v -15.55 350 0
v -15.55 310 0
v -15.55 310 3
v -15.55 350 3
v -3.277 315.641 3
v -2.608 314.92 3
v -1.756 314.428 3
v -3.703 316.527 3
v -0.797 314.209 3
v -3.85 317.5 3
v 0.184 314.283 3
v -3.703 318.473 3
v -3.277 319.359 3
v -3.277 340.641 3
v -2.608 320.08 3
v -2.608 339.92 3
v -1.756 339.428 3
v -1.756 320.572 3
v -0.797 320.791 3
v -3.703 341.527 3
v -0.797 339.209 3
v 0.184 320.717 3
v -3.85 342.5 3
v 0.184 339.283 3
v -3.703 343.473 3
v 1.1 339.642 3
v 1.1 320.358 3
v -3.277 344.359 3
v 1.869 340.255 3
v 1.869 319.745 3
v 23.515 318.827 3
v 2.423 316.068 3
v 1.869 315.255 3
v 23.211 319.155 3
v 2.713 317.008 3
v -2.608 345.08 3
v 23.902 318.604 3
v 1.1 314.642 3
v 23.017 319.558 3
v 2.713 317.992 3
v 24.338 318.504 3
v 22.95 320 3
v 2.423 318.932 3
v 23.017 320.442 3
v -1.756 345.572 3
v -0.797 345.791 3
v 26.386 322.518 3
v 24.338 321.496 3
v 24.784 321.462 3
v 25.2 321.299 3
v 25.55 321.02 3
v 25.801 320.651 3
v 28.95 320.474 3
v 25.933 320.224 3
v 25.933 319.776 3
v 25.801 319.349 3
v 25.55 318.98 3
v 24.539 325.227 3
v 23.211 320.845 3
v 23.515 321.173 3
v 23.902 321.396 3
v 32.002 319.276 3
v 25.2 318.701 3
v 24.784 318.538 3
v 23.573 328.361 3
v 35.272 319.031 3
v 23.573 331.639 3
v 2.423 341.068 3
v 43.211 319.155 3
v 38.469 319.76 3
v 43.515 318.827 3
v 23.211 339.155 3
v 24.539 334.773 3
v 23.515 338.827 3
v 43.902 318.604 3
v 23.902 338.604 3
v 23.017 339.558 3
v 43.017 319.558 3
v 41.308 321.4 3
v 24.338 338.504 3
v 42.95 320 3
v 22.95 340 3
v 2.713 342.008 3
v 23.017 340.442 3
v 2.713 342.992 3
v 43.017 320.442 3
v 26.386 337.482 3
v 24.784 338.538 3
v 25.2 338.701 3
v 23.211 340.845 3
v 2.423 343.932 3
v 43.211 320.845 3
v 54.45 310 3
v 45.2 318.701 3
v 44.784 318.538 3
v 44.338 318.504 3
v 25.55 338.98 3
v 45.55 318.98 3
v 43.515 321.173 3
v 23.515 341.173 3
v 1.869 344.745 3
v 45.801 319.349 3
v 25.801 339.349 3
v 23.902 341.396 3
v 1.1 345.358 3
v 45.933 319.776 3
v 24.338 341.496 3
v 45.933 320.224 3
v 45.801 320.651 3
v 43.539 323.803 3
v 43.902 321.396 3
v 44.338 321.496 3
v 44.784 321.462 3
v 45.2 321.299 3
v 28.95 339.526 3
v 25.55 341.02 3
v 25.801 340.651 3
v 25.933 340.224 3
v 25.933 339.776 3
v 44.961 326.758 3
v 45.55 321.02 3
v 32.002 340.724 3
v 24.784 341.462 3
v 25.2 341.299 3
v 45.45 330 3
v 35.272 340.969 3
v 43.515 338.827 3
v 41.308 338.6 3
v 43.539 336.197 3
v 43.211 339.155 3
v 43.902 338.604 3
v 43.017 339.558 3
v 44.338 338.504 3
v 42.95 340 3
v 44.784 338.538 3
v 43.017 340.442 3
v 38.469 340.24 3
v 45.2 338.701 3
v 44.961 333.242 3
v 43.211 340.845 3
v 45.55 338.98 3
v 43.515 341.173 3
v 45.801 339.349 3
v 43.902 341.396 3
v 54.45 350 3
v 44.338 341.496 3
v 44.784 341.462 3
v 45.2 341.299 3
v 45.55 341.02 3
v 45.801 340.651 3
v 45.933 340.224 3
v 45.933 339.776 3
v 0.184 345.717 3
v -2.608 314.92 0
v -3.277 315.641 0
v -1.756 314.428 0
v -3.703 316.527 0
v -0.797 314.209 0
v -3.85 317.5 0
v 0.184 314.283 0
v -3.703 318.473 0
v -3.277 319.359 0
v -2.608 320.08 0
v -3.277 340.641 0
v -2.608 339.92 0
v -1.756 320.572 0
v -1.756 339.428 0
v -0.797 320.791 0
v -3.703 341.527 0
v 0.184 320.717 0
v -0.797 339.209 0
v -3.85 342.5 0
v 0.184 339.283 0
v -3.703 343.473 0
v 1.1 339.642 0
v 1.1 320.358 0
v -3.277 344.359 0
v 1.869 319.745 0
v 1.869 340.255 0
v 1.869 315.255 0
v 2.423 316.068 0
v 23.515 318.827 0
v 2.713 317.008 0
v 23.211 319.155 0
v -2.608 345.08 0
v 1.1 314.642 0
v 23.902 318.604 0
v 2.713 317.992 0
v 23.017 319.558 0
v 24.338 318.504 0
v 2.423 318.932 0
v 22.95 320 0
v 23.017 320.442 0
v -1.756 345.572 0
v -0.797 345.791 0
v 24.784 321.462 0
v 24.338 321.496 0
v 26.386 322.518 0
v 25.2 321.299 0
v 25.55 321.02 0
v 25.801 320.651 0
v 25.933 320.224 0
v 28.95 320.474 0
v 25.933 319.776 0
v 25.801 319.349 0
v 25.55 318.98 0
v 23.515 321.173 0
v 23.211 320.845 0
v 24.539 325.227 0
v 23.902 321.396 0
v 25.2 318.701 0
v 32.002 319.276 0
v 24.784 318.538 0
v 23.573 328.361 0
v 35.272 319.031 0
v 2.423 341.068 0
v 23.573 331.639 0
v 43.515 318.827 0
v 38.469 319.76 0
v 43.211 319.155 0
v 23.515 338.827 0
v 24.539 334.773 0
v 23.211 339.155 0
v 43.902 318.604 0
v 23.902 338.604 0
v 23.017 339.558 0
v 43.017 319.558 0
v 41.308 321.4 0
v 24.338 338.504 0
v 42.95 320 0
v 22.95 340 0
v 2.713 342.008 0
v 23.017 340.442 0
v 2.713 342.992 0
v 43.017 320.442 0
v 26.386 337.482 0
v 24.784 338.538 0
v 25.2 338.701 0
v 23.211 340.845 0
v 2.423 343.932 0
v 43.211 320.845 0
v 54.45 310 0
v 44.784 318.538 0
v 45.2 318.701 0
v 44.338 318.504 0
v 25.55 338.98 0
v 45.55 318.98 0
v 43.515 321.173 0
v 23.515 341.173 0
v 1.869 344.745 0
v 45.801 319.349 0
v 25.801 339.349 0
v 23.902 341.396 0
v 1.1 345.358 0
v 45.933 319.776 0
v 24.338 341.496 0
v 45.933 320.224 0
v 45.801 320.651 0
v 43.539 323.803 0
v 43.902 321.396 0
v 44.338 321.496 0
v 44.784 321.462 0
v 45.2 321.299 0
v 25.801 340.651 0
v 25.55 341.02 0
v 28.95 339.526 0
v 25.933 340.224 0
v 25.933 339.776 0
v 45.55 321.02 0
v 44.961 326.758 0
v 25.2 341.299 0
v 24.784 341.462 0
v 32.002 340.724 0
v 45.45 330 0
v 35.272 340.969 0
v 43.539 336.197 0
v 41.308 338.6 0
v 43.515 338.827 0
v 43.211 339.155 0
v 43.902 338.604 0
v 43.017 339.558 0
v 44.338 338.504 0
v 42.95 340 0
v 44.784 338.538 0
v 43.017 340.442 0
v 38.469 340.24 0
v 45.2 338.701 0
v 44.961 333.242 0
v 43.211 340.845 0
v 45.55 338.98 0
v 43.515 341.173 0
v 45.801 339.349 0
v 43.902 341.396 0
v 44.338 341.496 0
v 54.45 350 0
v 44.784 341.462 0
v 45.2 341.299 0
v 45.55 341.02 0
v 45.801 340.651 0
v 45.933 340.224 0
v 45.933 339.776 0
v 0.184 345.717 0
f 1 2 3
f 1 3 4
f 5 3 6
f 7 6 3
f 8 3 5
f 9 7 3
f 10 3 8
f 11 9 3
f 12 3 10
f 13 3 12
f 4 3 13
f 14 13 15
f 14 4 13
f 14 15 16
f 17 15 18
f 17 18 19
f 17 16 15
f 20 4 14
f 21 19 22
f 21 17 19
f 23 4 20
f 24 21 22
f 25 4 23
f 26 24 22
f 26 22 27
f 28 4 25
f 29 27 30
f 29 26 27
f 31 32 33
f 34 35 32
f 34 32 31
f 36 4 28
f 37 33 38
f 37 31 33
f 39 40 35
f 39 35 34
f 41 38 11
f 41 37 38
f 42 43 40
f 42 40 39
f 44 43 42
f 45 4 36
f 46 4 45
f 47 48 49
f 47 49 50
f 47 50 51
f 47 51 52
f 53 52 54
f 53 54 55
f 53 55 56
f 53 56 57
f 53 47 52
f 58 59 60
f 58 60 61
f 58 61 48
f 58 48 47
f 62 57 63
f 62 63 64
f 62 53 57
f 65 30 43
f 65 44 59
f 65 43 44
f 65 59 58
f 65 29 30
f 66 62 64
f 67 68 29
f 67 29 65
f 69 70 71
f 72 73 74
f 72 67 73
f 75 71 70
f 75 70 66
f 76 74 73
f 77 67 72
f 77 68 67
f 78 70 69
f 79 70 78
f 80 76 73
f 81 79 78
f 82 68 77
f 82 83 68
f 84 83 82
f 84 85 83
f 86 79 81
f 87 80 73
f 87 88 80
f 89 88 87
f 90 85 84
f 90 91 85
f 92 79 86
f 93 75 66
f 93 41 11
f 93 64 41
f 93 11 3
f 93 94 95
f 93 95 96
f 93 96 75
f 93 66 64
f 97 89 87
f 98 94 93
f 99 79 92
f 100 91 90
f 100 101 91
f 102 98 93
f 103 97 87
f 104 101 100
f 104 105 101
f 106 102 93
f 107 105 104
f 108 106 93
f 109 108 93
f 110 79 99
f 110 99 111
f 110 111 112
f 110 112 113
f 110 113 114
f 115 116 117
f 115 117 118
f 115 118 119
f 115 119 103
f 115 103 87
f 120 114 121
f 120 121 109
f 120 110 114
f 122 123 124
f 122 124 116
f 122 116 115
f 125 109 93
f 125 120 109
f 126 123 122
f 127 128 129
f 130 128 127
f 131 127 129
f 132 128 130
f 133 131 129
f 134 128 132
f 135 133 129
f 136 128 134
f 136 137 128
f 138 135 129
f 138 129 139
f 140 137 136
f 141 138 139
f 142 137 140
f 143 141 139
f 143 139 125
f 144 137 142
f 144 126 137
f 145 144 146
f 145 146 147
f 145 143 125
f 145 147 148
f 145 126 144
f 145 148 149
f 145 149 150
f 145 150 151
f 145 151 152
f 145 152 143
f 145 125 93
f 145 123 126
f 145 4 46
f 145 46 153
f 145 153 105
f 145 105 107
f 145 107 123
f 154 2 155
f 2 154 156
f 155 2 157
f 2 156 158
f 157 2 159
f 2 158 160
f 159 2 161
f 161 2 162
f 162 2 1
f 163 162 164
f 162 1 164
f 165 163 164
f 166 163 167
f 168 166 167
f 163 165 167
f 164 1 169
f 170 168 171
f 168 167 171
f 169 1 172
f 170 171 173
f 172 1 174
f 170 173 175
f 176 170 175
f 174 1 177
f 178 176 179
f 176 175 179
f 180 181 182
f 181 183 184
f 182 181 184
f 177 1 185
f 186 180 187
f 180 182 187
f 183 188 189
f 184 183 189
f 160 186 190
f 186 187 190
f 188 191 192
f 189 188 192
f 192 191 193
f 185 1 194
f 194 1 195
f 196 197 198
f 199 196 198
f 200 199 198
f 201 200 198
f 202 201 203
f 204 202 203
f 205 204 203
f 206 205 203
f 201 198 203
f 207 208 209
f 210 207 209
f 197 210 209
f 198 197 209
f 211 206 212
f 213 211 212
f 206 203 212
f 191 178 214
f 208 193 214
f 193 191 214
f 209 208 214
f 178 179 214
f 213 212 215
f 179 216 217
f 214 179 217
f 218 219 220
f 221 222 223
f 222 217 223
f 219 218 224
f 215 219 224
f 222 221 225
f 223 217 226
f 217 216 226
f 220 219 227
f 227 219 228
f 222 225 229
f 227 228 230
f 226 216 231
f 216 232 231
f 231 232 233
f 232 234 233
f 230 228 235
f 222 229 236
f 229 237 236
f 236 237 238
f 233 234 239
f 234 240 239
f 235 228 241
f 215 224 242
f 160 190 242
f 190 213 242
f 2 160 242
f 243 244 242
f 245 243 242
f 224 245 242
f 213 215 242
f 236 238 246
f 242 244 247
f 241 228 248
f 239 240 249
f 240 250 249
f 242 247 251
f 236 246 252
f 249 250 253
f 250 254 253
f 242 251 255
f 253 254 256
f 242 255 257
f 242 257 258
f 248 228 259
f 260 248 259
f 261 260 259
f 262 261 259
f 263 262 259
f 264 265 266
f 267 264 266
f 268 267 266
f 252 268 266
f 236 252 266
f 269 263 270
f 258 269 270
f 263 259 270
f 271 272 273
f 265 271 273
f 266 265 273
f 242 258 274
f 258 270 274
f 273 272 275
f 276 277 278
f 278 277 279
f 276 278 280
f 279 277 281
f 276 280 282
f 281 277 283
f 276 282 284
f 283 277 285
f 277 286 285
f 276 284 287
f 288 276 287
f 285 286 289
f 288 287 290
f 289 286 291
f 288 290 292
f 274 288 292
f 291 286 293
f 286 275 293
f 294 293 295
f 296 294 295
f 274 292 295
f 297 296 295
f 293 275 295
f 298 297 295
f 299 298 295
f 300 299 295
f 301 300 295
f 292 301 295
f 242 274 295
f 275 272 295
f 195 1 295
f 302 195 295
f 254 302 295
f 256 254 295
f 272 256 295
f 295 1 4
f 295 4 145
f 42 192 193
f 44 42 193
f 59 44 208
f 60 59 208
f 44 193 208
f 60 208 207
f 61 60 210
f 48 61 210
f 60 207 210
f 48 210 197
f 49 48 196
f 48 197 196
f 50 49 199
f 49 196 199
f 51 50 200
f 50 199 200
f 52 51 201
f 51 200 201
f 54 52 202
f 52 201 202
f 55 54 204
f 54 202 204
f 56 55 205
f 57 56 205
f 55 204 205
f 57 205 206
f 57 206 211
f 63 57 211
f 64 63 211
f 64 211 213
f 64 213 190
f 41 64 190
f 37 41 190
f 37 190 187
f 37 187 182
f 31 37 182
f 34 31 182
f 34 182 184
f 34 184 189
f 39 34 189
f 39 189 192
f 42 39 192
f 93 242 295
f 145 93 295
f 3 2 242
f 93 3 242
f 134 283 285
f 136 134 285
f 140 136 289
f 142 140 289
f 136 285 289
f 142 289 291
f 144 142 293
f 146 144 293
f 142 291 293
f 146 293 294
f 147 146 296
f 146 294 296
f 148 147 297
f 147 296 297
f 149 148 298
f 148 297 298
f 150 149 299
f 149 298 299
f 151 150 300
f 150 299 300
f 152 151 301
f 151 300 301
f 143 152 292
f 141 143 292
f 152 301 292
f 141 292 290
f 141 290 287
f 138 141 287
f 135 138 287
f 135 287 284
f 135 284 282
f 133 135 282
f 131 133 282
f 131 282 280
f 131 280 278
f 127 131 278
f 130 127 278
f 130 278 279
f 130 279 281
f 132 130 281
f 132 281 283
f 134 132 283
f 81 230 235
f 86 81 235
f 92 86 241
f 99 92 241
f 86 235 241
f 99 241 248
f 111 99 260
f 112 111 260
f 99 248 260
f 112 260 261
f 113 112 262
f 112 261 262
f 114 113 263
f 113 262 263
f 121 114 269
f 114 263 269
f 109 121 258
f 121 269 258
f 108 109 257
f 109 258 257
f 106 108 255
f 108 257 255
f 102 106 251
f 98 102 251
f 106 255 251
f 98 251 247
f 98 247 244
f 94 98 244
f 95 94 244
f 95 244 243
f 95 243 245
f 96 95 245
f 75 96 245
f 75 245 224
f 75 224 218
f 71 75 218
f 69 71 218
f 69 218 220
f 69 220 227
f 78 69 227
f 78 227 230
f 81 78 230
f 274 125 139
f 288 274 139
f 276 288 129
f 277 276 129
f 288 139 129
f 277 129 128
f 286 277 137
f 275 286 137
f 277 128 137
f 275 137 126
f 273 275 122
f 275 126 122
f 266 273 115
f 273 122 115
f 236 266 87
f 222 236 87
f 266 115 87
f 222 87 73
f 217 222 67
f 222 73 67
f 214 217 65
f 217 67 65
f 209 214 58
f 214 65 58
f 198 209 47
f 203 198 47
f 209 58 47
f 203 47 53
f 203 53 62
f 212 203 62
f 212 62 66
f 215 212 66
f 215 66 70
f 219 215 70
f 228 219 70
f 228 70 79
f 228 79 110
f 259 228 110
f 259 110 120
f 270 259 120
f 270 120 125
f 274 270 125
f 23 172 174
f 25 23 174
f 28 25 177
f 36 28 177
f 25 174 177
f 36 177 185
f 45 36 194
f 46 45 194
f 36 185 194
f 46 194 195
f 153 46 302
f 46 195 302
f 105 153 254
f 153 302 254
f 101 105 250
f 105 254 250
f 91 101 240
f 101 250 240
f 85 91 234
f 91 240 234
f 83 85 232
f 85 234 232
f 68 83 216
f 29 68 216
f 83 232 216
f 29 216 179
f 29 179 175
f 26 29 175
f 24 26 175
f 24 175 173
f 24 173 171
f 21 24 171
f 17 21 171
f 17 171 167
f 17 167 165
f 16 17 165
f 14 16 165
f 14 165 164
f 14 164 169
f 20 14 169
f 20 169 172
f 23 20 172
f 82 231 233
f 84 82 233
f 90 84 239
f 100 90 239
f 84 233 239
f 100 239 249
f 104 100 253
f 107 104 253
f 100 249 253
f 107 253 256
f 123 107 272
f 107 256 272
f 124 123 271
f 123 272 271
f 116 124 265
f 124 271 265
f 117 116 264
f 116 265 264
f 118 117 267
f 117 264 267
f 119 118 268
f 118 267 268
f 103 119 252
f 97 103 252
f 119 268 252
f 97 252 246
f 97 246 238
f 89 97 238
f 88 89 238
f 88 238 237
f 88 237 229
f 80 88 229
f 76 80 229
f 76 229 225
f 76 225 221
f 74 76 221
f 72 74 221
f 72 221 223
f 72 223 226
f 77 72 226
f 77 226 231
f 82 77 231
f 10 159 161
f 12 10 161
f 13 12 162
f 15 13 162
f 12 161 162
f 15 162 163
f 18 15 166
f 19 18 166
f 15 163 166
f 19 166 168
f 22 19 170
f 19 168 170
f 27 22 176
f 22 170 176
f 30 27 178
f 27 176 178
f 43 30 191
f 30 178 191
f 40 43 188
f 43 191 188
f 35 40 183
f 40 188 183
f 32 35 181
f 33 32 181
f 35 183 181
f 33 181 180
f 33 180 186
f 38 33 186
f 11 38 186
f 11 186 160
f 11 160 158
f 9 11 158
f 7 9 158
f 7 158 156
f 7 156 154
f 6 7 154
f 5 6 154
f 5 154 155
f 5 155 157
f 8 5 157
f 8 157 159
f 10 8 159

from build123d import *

# Parameters (mm, degrees)
SKIZZE1_W                        = 70
SKIZZE1_H                        = 40
AUFSATZ_LINEAR_AUSTRAGEN1_DEPTH  = 3
F_3_0_3_DURCHMESSER_BOHRUNG2_D   = 3
DURCHGANGSLOCH_F_R_M61_D         = 6.6
F_22_0_22_DURCHMESSER_BOHRUNG1_D = 22


with BuildPart() as part:
    # Skizze1 → Aufsatz-Linear austragen1 (new body)
    with BuildSketch(Plane.XY):
        with Locations((19.450005134, 330)):
            Rectangle(SKIZZE1_W, SKIZZE1_H)
    extrude(amount=AUFSATZ_LINEAR_AUSTRAGEN1_DEPTH)

    # Ø3.0 (3) Durchmesser Bohrung2 (through all)
    with Locations(Plane.XY.offset(3)):
        with Locations((24.450005134, 340), (44.450005134, 340), (44.450005134, 320), (24.450005134, 320)):
            Hole(F_3_0_3_DURCHMESSER_BOHRUNG2_D / 2)

    # Durchgangsloch für M61 (through all)
    with Locations(Plane.XY.offset(3)):
        with Locations((-0.549994866, 342.5), (-0.549994866, 317.5)):
            Hole(DURCHGANGSLOCH_F_R_M61_D / 2)

    # Ø22.0 (22) Durchmesser Bohrung1 (through all)
    with Locations(Plane(origin=(0, 0, 0), x_dir=(-1, 0, 0), z_dir=(0, 0, -1))):
        with Locations((-34.450005134, 330)):
            Hole(F_22_0_22_DURCHMESSER_BOHRUNG1_D / 2)


solid = part.part
